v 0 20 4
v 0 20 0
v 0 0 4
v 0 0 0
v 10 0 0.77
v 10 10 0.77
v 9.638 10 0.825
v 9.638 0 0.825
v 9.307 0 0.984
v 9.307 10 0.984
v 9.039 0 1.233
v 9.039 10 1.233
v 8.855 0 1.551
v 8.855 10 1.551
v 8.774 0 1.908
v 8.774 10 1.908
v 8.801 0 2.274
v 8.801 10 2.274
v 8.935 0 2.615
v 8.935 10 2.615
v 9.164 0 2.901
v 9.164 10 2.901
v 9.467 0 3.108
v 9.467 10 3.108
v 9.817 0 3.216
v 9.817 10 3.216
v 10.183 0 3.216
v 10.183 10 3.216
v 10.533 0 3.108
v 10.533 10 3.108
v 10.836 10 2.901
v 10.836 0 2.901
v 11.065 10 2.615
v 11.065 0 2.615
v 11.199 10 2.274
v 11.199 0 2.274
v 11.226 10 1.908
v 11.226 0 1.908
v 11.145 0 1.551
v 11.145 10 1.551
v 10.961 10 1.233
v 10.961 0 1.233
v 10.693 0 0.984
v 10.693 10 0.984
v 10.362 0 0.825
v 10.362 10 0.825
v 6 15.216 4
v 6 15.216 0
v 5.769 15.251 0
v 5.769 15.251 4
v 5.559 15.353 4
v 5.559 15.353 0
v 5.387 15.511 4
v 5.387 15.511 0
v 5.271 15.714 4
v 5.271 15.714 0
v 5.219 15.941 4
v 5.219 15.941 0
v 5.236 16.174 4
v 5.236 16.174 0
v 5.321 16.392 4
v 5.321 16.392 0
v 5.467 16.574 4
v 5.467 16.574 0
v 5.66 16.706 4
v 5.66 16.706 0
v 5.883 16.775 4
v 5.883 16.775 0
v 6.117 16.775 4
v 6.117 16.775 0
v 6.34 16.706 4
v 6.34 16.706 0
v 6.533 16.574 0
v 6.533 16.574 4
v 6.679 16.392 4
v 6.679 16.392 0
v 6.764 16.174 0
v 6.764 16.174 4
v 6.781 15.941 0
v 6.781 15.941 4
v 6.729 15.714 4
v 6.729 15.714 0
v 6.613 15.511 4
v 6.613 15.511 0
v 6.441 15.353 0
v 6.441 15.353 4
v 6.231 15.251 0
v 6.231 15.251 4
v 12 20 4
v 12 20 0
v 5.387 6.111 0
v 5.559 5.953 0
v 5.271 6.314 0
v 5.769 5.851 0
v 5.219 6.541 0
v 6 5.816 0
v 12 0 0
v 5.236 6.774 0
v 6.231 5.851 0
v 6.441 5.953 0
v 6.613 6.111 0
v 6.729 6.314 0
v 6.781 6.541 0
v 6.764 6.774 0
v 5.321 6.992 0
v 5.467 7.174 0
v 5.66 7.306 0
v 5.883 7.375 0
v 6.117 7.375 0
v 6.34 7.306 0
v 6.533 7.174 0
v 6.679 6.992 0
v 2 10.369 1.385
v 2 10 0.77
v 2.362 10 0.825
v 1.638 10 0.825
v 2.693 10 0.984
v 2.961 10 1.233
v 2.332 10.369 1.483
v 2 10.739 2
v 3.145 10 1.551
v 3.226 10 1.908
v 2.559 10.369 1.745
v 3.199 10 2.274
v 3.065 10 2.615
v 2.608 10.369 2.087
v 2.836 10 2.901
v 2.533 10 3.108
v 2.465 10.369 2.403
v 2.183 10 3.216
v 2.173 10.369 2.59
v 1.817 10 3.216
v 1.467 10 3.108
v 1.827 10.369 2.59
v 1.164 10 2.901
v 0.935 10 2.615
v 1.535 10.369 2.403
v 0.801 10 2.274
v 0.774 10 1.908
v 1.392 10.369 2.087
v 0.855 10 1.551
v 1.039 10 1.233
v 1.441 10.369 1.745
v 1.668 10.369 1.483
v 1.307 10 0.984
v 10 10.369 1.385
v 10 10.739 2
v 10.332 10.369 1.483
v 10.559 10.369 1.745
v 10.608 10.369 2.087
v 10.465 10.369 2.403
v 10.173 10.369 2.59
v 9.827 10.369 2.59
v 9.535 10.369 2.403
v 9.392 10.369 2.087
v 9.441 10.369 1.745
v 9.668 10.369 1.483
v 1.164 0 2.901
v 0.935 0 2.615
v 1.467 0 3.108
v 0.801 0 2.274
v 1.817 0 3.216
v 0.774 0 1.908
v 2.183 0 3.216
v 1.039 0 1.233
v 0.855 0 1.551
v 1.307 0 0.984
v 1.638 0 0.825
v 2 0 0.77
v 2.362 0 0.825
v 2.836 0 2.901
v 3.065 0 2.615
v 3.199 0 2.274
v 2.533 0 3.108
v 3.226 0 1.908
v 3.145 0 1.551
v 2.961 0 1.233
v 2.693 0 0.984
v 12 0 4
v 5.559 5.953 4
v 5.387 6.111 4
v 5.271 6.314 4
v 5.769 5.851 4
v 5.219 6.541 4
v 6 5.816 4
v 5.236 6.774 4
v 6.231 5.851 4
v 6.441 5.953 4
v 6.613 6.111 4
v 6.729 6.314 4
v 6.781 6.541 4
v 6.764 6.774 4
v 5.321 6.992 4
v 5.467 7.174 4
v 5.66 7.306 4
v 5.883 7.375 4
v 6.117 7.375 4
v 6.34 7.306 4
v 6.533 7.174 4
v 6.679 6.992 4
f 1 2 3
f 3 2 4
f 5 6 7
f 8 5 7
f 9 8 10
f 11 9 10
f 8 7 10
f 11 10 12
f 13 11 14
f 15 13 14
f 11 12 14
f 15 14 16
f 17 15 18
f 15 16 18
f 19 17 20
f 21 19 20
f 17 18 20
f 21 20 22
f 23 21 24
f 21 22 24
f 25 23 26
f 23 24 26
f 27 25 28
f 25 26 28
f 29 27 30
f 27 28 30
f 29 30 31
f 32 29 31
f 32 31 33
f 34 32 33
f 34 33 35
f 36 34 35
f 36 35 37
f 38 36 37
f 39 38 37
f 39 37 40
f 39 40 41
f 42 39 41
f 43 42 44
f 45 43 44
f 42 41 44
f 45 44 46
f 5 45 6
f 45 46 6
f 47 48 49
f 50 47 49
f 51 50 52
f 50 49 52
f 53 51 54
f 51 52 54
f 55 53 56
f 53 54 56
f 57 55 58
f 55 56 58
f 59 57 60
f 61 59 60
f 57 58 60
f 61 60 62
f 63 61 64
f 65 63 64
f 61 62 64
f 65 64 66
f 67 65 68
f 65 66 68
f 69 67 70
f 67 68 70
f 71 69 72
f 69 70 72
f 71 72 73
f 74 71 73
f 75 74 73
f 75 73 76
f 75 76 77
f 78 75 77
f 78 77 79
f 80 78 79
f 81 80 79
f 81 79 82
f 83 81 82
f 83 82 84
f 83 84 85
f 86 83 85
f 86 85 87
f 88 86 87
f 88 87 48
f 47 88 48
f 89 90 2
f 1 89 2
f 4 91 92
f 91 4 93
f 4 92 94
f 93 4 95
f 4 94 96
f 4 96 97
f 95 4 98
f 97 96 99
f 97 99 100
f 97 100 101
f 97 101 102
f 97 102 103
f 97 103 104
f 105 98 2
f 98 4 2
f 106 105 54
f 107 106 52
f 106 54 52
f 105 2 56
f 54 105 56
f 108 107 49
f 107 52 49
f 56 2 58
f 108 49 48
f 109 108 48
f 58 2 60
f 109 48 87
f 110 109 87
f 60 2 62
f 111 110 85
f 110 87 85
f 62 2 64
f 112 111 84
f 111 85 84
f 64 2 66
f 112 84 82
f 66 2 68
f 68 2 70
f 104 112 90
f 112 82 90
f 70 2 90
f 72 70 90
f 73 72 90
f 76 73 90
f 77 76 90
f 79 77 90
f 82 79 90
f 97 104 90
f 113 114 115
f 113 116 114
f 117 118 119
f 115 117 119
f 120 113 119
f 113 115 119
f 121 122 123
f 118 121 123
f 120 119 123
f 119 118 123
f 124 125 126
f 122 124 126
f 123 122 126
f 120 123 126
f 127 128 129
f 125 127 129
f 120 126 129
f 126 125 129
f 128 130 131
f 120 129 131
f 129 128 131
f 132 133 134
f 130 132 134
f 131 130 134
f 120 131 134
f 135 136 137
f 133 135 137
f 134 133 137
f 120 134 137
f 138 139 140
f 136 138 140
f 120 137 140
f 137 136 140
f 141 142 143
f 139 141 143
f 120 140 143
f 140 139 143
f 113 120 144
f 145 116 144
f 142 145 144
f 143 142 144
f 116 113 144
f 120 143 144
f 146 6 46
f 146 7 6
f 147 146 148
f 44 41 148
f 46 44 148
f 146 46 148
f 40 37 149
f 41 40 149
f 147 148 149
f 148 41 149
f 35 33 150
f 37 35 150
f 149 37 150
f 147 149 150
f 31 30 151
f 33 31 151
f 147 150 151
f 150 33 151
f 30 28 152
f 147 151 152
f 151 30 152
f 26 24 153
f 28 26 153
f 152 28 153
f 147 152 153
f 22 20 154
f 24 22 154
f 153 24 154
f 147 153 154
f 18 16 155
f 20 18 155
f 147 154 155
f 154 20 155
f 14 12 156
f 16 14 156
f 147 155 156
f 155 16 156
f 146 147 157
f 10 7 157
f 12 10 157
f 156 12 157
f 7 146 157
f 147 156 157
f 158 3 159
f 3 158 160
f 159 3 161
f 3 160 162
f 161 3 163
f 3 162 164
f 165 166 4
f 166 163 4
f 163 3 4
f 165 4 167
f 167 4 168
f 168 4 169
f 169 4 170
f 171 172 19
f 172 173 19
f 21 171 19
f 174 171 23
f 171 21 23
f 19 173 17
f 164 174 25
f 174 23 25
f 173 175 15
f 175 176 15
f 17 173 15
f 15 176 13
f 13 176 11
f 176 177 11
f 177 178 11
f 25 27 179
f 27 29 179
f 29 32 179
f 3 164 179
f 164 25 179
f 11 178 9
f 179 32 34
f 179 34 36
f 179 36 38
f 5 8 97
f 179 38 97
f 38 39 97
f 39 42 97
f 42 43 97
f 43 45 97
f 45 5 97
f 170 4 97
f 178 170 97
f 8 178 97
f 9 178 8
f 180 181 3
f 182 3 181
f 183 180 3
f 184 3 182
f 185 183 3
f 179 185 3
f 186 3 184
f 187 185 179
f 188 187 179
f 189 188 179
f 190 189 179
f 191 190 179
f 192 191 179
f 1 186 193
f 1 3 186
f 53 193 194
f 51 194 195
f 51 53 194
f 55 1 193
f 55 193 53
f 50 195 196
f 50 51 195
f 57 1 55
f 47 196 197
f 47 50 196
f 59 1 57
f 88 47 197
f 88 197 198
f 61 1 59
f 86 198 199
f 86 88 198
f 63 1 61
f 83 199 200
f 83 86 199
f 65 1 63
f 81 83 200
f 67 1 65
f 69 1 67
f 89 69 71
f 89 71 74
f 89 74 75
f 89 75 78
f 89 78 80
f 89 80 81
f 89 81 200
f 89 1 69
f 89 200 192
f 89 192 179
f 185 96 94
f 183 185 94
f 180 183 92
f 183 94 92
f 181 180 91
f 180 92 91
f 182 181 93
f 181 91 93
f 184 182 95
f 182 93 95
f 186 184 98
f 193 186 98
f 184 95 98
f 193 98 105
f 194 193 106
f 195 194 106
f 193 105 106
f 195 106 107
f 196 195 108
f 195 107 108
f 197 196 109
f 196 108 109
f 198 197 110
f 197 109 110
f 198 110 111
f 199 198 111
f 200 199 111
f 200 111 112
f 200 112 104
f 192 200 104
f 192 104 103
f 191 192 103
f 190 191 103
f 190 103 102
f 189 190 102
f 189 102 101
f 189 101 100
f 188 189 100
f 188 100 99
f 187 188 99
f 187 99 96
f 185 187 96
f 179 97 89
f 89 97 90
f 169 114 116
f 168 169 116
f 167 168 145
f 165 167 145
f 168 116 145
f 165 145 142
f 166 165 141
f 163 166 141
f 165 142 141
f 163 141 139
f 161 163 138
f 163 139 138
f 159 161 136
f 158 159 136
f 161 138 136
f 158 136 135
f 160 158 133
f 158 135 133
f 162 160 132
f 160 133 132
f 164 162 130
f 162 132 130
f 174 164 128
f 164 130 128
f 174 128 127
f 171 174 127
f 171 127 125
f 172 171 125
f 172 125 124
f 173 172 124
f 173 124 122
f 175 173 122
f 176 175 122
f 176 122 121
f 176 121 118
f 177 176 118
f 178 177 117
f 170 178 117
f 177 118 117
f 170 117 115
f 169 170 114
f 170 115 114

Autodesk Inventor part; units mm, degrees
ref_plane "YZ Plane" through (0, 0, 0) normal (1, 0, 0) x (0, 1, 0)
ref_plane "XZ Plane" through (0, 0, 0) normal (0, 1, 0) x (-1, 0, 0)
ref_plane "XY Plane" through (0, 0, 0) normal (0, 0, 1) x (1, 0, 0)
sketch "Skizze1" plane through (0, 0, 0) normal (0, 0, 1) x (1, 0, 0)
  line L0 (0, 0) -> (12, 0)
  line L1 (12, 0) -> (12, 20)
  line L2 (12, 20) -> (0, 20)
  line L3 (0, 20) -> (0, 0)
  dimension "d0" = 20
  dimension "d1" = 12
extrude "Extrusion1" add sketch "Skizze1" along normal blind 4
sketch "Skizze2" plane through (0, 0, 0) normal (0, -1, 0) x (1, 0, 0)
  line L0 (12, 4) -> (0, 4) projected
  line L1 (0, 0) -> (0, 4) projected
  line L2 (0, 0) -> (12, 0) projected
  line L3 (12, 0) -> (12, 4) projected
  line L4 (0, 2) -> (12, 2)
  line L5 (6, 4) -> (6, 0)
  point P0 (2, 2)
  point P1 (10, 2)
  dimension "d4" = 8
hole "Bohrung1" at (2, 0, 2) at (10, 0, 2) direction (0, 1, 0) diameter 2.459 depth 10 tip angle 118 thread size "M3x0.5" class "6H" standard "ISO Metric profile"
sketch "Skizze3" plane through (0, 0, 4) normal (0, 0, 1) x (1, 0, 0)
  line L0 (12, 0) -> (0, 0) projected
  line L1 (0, 20) -> (12, 20) projected
  line L2 (6, 0) -> (6, 20)
  point P0 (6, 16)
  point P1 (6, 6.6)
  dimension "d13" = 9.4
  dimension "d14" = 4
hole "Bohrung2" at (6, 16, 4) at (6, 6.6, 4) direction (0, 0, -1) diameter 1.567 depth 10 tip angle 118 thread size "M2x0.4" class "6H" standard "ISO Metric profile"
properties part number "13_0204_066"
